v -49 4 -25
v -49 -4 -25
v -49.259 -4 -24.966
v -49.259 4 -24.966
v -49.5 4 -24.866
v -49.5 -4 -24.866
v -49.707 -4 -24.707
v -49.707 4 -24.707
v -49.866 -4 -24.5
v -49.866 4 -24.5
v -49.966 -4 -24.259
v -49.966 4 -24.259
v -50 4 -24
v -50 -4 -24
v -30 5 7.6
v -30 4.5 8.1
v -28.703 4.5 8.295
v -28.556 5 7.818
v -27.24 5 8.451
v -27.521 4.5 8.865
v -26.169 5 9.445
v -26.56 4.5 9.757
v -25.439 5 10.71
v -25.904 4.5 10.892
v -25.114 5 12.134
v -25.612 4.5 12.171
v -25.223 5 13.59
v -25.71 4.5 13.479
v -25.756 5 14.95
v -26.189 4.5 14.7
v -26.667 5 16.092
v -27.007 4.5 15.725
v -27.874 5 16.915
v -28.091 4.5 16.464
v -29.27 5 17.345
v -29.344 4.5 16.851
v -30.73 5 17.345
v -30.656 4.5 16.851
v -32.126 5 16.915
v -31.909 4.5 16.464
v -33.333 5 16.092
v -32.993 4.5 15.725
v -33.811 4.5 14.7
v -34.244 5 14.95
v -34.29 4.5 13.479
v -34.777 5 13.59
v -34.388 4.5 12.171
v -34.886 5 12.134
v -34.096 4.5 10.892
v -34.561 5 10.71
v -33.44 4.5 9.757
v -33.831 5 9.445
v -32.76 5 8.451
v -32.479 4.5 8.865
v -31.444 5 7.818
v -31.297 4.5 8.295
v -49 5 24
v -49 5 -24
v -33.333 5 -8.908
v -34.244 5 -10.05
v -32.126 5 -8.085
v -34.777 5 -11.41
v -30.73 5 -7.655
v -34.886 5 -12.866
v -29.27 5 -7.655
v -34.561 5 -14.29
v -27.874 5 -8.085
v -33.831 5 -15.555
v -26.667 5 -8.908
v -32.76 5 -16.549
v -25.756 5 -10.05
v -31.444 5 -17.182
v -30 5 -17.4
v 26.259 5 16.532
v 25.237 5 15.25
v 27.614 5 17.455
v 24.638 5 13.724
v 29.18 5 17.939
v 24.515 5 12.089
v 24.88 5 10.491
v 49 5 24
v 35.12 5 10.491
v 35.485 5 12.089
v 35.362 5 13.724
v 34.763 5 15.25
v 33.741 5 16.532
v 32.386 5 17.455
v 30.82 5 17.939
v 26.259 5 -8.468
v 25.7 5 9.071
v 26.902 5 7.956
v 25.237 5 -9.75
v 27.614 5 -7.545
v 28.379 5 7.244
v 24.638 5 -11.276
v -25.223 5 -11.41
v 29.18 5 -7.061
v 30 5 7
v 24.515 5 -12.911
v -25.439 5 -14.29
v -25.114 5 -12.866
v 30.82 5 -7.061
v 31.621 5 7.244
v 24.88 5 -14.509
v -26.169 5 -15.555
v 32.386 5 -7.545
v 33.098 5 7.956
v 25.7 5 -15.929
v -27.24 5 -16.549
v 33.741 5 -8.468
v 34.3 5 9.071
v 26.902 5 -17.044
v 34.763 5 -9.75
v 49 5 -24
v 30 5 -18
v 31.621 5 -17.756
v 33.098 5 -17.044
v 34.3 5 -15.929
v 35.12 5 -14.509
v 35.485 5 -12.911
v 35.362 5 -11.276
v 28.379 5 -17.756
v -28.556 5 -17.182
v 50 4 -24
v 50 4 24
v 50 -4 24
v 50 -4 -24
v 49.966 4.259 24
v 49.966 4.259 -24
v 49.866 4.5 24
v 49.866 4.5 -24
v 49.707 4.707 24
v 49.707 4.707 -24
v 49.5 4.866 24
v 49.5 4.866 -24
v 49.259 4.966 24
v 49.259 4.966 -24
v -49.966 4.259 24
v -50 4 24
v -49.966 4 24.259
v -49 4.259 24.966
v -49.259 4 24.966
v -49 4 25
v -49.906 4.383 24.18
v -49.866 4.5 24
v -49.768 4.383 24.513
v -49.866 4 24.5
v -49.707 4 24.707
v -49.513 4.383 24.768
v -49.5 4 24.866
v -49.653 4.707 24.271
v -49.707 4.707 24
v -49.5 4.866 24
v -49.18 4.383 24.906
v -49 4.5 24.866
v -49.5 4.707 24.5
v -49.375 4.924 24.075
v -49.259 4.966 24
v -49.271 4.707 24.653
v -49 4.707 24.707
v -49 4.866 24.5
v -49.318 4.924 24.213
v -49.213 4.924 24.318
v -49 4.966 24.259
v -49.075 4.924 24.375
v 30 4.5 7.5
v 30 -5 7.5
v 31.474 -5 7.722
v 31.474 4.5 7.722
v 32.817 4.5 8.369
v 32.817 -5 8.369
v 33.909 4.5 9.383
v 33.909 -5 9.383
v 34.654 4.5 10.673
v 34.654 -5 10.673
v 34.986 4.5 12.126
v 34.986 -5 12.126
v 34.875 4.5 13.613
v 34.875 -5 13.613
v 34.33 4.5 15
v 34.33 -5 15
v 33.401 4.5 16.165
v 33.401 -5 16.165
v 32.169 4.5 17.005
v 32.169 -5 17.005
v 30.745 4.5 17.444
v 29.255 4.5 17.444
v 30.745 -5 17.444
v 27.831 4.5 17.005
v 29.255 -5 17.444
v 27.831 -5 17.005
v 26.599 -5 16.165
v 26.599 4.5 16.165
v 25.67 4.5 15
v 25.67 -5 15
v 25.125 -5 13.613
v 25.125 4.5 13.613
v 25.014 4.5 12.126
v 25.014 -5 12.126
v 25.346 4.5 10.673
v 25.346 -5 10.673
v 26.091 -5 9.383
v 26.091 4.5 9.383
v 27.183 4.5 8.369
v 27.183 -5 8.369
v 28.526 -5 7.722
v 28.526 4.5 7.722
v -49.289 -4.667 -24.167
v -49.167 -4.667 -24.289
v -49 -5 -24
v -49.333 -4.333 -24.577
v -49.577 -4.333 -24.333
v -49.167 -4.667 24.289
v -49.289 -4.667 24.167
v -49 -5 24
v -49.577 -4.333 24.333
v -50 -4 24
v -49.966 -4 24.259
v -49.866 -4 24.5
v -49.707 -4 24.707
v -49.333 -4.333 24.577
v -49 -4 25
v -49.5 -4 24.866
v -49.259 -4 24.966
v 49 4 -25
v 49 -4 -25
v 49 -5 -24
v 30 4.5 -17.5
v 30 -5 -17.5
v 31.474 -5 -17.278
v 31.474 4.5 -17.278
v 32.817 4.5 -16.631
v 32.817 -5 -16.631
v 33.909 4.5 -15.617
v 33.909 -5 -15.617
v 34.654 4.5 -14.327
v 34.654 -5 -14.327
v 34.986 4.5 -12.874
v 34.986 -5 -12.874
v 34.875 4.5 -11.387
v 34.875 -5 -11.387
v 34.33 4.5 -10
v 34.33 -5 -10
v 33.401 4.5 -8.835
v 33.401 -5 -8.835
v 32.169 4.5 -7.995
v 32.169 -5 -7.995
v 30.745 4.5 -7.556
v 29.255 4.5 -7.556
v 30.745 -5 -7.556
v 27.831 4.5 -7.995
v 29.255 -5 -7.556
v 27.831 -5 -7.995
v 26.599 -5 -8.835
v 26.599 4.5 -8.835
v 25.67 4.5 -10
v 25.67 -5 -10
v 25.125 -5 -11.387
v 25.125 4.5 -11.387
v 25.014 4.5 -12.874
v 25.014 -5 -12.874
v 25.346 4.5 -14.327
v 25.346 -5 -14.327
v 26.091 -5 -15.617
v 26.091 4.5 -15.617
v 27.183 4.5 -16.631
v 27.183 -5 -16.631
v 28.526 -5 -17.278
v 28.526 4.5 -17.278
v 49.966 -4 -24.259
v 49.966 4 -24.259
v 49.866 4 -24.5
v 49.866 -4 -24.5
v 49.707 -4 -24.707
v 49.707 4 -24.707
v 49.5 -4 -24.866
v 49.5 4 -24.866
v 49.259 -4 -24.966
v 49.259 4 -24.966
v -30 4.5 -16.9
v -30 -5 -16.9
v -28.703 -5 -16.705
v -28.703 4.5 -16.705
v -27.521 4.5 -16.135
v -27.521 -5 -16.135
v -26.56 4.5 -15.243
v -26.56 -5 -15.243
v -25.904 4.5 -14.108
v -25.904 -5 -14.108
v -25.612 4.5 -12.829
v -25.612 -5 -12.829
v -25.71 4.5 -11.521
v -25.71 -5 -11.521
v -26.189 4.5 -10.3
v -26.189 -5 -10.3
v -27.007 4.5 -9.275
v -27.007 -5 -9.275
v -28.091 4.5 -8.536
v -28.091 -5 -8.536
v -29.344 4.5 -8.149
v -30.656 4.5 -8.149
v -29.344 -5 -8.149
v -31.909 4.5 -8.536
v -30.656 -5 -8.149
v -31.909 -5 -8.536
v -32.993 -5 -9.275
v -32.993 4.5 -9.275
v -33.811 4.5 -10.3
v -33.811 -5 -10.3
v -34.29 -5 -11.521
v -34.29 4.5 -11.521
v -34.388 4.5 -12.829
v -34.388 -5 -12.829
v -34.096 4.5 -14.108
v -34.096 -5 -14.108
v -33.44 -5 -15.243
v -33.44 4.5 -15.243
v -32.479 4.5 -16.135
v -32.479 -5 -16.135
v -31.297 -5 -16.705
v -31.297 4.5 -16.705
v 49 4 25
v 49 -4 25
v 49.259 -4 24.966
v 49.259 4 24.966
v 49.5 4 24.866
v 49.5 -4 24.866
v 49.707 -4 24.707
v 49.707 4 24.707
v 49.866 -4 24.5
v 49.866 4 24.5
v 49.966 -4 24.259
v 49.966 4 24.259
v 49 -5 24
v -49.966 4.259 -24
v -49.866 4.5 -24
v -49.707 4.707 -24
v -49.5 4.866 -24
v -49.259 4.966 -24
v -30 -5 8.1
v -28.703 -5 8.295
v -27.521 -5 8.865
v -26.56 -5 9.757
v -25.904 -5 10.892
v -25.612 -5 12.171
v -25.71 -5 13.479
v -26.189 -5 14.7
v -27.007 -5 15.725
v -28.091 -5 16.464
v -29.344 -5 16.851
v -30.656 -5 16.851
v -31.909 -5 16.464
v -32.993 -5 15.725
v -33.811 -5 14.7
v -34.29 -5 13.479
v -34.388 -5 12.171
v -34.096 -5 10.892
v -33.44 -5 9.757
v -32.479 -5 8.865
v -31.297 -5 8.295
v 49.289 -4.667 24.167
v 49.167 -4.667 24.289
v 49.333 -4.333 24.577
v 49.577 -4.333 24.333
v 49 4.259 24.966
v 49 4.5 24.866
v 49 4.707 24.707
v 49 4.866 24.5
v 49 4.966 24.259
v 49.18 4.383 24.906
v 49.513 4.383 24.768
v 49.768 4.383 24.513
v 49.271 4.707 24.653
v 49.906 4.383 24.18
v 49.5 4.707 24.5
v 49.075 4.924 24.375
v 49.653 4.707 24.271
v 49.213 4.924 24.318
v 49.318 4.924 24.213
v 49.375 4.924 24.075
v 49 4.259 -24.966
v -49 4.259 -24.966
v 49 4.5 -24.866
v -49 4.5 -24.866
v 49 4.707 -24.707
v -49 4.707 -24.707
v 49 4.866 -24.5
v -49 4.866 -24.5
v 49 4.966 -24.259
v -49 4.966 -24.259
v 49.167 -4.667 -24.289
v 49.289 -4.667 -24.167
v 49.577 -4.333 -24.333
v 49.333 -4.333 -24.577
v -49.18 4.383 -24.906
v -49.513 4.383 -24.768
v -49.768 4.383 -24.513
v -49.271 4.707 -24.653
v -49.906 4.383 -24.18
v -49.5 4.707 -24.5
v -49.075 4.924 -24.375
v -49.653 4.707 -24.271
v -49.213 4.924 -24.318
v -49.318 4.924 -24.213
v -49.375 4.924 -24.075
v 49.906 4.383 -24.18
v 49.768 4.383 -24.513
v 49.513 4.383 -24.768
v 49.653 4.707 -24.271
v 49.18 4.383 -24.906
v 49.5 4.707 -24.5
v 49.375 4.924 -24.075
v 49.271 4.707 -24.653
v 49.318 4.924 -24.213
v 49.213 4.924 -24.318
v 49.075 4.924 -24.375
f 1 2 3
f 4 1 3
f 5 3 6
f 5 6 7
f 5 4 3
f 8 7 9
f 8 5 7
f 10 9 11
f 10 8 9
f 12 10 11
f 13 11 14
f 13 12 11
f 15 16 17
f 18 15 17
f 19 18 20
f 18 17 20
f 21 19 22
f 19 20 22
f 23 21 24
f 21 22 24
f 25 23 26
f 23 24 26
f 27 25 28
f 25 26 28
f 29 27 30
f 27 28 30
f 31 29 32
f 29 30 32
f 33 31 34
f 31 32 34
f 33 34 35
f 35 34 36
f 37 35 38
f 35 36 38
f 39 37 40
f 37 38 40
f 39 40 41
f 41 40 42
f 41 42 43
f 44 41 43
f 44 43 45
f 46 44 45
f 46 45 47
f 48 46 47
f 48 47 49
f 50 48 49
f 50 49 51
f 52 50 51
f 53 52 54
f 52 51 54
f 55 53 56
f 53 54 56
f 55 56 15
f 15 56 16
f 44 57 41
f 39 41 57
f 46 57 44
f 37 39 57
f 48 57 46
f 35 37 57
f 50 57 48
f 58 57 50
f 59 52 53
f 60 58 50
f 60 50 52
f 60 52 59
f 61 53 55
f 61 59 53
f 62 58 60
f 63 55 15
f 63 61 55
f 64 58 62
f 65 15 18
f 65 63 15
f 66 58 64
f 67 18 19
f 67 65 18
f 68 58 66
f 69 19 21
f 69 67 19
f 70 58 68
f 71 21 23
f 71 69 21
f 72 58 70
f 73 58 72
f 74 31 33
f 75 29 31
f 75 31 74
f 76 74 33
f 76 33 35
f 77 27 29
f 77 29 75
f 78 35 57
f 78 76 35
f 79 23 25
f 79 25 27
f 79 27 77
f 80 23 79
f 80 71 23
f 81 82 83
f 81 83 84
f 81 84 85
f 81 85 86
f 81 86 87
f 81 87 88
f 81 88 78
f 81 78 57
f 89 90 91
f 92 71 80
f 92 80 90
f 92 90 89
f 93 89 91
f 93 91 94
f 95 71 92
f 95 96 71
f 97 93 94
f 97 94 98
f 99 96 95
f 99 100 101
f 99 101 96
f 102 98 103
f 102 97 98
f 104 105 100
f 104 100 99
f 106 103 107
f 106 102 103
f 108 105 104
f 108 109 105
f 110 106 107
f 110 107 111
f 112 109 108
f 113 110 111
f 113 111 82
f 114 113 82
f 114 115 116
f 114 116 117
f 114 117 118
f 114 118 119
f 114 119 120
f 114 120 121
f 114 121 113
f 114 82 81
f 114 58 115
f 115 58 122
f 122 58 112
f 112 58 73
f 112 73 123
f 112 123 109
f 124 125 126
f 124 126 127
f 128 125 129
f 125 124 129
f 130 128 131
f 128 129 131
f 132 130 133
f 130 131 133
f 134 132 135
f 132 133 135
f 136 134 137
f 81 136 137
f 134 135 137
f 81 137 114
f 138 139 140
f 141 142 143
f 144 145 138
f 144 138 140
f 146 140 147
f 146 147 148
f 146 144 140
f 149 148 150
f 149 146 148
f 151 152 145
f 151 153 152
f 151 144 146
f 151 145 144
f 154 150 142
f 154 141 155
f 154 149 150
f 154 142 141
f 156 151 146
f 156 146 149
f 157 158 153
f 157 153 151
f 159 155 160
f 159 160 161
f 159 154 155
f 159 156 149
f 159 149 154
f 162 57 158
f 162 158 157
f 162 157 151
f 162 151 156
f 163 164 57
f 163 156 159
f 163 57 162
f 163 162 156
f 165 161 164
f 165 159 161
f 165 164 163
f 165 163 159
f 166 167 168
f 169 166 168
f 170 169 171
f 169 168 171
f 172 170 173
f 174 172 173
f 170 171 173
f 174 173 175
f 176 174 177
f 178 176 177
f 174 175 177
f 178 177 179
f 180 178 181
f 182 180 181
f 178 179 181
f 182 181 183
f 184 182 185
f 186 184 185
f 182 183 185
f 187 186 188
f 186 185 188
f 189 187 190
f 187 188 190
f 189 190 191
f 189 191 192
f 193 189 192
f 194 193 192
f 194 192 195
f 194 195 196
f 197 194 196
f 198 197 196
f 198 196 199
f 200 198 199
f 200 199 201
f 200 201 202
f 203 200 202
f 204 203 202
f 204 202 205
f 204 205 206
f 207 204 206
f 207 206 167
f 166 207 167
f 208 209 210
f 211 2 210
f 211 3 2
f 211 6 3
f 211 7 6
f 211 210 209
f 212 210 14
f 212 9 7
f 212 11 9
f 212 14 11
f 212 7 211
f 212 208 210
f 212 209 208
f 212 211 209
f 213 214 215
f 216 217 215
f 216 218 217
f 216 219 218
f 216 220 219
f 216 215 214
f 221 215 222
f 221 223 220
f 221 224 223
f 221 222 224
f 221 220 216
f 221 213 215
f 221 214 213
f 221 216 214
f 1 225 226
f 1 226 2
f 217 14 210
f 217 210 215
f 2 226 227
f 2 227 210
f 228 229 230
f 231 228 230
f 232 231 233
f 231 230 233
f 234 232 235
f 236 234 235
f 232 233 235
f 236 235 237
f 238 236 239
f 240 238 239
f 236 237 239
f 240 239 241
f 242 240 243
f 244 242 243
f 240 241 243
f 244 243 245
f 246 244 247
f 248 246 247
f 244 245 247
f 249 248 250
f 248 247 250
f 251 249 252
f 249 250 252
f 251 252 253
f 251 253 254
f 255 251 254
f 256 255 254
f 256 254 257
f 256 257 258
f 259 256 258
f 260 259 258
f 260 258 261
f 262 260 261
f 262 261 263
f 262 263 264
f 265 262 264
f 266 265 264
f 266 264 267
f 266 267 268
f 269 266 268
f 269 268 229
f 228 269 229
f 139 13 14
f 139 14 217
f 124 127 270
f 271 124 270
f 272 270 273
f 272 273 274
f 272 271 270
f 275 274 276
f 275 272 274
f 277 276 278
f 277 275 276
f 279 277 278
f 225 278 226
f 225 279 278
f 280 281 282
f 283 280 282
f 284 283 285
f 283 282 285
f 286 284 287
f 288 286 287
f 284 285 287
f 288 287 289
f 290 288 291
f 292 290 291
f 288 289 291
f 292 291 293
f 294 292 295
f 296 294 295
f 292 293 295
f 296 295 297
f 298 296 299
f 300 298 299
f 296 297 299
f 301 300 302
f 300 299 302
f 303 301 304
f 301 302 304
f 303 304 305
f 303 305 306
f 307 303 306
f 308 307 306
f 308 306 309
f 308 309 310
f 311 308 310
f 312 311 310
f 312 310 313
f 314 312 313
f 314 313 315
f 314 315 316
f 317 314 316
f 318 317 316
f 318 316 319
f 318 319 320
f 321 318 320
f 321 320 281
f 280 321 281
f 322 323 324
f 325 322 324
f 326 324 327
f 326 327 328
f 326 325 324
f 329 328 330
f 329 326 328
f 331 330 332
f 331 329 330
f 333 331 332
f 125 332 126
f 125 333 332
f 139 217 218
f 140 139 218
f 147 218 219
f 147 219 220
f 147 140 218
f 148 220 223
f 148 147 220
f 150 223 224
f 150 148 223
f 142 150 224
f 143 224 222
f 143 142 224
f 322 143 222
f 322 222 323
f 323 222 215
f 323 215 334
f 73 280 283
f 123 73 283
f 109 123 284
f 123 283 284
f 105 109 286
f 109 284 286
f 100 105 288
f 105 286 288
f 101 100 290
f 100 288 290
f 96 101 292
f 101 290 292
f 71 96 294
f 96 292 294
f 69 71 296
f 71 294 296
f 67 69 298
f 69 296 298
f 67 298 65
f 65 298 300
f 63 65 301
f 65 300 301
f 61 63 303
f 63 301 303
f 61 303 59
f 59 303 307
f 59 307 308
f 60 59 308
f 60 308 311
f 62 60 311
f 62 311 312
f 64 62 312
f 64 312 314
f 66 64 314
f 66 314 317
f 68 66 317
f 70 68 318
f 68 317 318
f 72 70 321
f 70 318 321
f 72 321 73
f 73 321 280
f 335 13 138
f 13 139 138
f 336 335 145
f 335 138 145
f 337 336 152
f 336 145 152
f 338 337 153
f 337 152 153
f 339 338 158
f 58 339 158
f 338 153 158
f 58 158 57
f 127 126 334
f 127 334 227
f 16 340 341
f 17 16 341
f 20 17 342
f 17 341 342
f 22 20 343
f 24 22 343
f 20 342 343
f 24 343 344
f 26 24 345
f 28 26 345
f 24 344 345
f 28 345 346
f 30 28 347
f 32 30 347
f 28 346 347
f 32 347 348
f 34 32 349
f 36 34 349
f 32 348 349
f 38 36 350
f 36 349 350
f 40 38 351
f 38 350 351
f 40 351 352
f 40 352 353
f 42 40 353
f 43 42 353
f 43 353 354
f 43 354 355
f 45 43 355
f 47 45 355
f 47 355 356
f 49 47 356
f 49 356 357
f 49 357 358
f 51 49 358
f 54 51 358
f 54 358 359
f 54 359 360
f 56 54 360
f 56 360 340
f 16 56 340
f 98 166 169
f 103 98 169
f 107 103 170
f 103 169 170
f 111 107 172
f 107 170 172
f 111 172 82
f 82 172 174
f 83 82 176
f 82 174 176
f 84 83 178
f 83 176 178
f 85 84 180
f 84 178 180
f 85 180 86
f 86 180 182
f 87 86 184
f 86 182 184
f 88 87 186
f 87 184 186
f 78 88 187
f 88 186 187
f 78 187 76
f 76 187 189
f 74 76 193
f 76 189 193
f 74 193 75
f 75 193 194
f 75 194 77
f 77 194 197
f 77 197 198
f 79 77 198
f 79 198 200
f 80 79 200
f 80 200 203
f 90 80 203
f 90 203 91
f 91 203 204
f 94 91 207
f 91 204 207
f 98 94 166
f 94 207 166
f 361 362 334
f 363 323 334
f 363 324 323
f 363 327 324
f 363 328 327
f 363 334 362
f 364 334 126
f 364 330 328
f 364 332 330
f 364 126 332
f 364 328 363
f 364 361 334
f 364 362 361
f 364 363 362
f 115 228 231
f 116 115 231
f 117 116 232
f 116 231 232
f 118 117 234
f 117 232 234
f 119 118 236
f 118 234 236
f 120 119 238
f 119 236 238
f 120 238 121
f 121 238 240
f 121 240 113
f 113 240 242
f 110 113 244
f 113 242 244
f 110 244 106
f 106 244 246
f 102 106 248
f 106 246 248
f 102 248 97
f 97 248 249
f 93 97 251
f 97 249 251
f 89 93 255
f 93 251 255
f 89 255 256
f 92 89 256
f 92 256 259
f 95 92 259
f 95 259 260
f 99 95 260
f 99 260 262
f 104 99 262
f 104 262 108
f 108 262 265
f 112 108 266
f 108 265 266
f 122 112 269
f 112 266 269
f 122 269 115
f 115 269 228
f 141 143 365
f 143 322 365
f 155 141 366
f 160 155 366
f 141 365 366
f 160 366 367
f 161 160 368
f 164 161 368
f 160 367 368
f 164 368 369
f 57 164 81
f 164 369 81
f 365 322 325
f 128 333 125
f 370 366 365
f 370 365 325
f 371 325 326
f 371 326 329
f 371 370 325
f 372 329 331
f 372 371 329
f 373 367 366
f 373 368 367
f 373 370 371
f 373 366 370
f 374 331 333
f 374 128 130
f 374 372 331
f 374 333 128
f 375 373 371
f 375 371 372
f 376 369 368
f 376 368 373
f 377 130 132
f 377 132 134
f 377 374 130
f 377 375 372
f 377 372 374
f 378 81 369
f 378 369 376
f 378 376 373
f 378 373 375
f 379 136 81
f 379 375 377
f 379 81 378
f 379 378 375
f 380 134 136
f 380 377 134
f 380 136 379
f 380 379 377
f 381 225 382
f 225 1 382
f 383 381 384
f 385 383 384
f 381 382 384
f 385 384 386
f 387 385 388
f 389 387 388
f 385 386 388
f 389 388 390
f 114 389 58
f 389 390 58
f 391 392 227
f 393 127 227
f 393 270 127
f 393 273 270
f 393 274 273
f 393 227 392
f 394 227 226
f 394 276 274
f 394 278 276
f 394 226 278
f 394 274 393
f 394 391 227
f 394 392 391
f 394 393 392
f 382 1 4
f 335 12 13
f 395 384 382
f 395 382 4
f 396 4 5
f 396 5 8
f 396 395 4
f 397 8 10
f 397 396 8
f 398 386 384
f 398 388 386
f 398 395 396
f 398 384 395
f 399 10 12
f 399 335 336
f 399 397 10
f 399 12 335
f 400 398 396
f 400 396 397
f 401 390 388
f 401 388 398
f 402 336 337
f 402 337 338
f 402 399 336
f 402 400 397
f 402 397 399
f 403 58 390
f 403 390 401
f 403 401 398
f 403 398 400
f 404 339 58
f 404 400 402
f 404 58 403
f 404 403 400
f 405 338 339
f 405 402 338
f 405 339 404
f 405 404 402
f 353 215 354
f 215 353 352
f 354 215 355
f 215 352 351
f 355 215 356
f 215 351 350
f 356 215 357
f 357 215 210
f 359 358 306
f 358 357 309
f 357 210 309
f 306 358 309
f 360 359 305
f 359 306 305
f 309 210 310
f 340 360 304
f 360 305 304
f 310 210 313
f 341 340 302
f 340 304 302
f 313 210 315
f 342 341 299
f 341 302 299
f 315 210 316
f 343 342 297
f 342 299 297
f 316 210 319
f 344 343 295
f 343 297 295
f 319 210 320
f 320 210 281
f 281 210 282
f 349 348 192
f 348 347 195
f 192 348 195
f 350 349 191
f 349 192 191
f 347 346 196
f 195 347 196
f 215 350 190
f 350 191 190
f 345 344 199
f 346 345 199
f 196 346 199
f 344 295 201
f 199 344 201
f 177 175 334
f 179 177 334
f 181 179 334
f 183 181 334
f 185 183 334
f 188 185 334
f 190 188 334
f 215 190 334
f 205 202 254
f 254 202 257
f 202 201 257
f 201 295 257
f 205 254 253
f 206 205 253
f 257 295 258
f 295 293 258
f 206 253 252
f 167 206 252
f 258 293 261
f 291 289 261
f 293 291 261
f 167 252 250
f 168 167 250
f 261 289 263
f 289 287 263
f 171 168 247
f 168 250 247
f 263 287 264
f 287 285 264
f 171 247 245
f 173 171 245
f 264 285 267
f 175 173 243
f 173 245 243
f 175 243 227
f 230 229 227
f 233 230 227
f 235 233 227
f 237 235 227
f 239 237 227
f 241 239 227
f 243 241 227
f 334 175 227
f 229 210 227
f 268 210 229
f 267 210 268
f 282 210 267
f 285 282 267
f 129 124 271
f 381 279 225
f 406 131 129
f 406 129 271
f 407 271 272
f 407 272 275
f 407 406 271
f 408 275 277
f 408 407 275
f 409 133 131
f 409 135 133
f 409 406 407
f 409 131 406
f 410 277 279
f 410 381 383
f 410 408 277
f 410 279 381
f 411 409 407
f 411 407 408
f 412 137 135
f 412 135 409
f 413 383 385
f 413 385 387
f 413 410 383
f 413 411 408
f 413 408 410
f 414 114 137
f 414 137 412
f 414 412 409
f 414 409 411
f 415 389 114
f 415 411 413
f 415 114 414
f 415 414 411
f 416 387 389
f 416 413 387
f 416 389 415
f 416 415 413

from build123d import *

# Parameters (mm, degrees)
BOSS_EXTRUDE1_DEPTH        = 5
FILLET1_R                  = 1
CHAMFER2_SIZE              = 1
M10X1_25_TAPPED_HOLE1_D    = 8.8
F_10_0_10_DIAMETER_HOLE1_D = 10
CHAMFER3_SIZE              = 0.5


with BuildPart() as part:
    # Sketch2 → Boss-Extrude1 (new, symmetric)
    with BuildSketch(Plane(origin=(0, 0, 0), x_dir=(1, 0, 0), z_dir=(0, 1, 0))):
        with BuildLine():
            Line((49, 25), (-49, 25))
            ThreePointArc((-49, 25), (-49.707106781, 24.707106781), (-50, 24))
            Line((-50, 24), (-50, -24))
            ThreePointArc((-50, -24), (-49.707106781, -24.707106781), (-49, -25))
            Line((-49, -25), (49, -25))
            ThreePointArc((49, -25), (49.707106781, -24.707106781), (50, -24))
            Line((50, -24), (50, 24))
            ThreePointArc((50, 24), (49.707106781, 24.707106781), (49, 25))
        make_face()
    extrude(amount=BOSS_EXTRUDE1_DEPTH, both=True)

    # Fillet1
    fillet1_edges = [part.edges().sort_by_distance(p)[0] for p in [
        (-49.707106781, 5, 24.707106781),
        (0, 5, 25),
        (49.707106781, 5, 24.707106781),
        (50, 5, 0),
        (49.707106781, 5, -24.707106781),
        (0, 5, -25),
        (-49.707106781, 5, -24.707106781),
        (-50, 5, 0),
    ]]
    fillet(fillet1_edges, radius=FILLET1_R)

    # Chamfer2
    chamfer2_edges = [part.edges().sort_by_distance(p)[0] for p in [
        (0, -5, 25),
        (-49.707106781, -5, 24.707106781),
        (-50, -5, 0),
        (-49.707106781, -5, -24.707106781),
        (0, -5, -25),
        (49.707106781, -5, -24.707106781),
        (50, -5, 0),
        (49.707106781, -5, 24.707106781),
    ]]
    chamfer(chamfer2_edges, length=CHAMFER2_SIZE)

    # M10x1.25 Tapped Hole1 (through all)
    with Locations(Plane(origin=(-30, 5, -12.5), x_dir=(0, 0, 1), z_dir=(0, 1, 0))):
        with Locations((0, 0), (25, 0)):
            Hole(M10X1_25_TAPPED_HOLE1_D / 2)

    # 10.0 _10_ Diameter Hole1 (through all)
    with Locations(Plane(origin=(30, 5, -12.5), x_dir=(0, 0, 1), z_dir=(0, 1, 0))):
        with Locations((0, 0), (25, 0)):
            Hole(F_10_0_10_DIAMETER_HOLE1_D / 2)

    # Chamfer3
    chamfer3_edges = [part.edges().sort_by_distance(p)[0] for p in [
        (-30, 5, 16.9),
        (-30, 5, -8.1),
        (30, 5, 17.5),
        (30, 5, -7.5),
    ]]
    chamfer(chamfer3_edges, length=CHAMFER3_SIZE)


solid = part.part
